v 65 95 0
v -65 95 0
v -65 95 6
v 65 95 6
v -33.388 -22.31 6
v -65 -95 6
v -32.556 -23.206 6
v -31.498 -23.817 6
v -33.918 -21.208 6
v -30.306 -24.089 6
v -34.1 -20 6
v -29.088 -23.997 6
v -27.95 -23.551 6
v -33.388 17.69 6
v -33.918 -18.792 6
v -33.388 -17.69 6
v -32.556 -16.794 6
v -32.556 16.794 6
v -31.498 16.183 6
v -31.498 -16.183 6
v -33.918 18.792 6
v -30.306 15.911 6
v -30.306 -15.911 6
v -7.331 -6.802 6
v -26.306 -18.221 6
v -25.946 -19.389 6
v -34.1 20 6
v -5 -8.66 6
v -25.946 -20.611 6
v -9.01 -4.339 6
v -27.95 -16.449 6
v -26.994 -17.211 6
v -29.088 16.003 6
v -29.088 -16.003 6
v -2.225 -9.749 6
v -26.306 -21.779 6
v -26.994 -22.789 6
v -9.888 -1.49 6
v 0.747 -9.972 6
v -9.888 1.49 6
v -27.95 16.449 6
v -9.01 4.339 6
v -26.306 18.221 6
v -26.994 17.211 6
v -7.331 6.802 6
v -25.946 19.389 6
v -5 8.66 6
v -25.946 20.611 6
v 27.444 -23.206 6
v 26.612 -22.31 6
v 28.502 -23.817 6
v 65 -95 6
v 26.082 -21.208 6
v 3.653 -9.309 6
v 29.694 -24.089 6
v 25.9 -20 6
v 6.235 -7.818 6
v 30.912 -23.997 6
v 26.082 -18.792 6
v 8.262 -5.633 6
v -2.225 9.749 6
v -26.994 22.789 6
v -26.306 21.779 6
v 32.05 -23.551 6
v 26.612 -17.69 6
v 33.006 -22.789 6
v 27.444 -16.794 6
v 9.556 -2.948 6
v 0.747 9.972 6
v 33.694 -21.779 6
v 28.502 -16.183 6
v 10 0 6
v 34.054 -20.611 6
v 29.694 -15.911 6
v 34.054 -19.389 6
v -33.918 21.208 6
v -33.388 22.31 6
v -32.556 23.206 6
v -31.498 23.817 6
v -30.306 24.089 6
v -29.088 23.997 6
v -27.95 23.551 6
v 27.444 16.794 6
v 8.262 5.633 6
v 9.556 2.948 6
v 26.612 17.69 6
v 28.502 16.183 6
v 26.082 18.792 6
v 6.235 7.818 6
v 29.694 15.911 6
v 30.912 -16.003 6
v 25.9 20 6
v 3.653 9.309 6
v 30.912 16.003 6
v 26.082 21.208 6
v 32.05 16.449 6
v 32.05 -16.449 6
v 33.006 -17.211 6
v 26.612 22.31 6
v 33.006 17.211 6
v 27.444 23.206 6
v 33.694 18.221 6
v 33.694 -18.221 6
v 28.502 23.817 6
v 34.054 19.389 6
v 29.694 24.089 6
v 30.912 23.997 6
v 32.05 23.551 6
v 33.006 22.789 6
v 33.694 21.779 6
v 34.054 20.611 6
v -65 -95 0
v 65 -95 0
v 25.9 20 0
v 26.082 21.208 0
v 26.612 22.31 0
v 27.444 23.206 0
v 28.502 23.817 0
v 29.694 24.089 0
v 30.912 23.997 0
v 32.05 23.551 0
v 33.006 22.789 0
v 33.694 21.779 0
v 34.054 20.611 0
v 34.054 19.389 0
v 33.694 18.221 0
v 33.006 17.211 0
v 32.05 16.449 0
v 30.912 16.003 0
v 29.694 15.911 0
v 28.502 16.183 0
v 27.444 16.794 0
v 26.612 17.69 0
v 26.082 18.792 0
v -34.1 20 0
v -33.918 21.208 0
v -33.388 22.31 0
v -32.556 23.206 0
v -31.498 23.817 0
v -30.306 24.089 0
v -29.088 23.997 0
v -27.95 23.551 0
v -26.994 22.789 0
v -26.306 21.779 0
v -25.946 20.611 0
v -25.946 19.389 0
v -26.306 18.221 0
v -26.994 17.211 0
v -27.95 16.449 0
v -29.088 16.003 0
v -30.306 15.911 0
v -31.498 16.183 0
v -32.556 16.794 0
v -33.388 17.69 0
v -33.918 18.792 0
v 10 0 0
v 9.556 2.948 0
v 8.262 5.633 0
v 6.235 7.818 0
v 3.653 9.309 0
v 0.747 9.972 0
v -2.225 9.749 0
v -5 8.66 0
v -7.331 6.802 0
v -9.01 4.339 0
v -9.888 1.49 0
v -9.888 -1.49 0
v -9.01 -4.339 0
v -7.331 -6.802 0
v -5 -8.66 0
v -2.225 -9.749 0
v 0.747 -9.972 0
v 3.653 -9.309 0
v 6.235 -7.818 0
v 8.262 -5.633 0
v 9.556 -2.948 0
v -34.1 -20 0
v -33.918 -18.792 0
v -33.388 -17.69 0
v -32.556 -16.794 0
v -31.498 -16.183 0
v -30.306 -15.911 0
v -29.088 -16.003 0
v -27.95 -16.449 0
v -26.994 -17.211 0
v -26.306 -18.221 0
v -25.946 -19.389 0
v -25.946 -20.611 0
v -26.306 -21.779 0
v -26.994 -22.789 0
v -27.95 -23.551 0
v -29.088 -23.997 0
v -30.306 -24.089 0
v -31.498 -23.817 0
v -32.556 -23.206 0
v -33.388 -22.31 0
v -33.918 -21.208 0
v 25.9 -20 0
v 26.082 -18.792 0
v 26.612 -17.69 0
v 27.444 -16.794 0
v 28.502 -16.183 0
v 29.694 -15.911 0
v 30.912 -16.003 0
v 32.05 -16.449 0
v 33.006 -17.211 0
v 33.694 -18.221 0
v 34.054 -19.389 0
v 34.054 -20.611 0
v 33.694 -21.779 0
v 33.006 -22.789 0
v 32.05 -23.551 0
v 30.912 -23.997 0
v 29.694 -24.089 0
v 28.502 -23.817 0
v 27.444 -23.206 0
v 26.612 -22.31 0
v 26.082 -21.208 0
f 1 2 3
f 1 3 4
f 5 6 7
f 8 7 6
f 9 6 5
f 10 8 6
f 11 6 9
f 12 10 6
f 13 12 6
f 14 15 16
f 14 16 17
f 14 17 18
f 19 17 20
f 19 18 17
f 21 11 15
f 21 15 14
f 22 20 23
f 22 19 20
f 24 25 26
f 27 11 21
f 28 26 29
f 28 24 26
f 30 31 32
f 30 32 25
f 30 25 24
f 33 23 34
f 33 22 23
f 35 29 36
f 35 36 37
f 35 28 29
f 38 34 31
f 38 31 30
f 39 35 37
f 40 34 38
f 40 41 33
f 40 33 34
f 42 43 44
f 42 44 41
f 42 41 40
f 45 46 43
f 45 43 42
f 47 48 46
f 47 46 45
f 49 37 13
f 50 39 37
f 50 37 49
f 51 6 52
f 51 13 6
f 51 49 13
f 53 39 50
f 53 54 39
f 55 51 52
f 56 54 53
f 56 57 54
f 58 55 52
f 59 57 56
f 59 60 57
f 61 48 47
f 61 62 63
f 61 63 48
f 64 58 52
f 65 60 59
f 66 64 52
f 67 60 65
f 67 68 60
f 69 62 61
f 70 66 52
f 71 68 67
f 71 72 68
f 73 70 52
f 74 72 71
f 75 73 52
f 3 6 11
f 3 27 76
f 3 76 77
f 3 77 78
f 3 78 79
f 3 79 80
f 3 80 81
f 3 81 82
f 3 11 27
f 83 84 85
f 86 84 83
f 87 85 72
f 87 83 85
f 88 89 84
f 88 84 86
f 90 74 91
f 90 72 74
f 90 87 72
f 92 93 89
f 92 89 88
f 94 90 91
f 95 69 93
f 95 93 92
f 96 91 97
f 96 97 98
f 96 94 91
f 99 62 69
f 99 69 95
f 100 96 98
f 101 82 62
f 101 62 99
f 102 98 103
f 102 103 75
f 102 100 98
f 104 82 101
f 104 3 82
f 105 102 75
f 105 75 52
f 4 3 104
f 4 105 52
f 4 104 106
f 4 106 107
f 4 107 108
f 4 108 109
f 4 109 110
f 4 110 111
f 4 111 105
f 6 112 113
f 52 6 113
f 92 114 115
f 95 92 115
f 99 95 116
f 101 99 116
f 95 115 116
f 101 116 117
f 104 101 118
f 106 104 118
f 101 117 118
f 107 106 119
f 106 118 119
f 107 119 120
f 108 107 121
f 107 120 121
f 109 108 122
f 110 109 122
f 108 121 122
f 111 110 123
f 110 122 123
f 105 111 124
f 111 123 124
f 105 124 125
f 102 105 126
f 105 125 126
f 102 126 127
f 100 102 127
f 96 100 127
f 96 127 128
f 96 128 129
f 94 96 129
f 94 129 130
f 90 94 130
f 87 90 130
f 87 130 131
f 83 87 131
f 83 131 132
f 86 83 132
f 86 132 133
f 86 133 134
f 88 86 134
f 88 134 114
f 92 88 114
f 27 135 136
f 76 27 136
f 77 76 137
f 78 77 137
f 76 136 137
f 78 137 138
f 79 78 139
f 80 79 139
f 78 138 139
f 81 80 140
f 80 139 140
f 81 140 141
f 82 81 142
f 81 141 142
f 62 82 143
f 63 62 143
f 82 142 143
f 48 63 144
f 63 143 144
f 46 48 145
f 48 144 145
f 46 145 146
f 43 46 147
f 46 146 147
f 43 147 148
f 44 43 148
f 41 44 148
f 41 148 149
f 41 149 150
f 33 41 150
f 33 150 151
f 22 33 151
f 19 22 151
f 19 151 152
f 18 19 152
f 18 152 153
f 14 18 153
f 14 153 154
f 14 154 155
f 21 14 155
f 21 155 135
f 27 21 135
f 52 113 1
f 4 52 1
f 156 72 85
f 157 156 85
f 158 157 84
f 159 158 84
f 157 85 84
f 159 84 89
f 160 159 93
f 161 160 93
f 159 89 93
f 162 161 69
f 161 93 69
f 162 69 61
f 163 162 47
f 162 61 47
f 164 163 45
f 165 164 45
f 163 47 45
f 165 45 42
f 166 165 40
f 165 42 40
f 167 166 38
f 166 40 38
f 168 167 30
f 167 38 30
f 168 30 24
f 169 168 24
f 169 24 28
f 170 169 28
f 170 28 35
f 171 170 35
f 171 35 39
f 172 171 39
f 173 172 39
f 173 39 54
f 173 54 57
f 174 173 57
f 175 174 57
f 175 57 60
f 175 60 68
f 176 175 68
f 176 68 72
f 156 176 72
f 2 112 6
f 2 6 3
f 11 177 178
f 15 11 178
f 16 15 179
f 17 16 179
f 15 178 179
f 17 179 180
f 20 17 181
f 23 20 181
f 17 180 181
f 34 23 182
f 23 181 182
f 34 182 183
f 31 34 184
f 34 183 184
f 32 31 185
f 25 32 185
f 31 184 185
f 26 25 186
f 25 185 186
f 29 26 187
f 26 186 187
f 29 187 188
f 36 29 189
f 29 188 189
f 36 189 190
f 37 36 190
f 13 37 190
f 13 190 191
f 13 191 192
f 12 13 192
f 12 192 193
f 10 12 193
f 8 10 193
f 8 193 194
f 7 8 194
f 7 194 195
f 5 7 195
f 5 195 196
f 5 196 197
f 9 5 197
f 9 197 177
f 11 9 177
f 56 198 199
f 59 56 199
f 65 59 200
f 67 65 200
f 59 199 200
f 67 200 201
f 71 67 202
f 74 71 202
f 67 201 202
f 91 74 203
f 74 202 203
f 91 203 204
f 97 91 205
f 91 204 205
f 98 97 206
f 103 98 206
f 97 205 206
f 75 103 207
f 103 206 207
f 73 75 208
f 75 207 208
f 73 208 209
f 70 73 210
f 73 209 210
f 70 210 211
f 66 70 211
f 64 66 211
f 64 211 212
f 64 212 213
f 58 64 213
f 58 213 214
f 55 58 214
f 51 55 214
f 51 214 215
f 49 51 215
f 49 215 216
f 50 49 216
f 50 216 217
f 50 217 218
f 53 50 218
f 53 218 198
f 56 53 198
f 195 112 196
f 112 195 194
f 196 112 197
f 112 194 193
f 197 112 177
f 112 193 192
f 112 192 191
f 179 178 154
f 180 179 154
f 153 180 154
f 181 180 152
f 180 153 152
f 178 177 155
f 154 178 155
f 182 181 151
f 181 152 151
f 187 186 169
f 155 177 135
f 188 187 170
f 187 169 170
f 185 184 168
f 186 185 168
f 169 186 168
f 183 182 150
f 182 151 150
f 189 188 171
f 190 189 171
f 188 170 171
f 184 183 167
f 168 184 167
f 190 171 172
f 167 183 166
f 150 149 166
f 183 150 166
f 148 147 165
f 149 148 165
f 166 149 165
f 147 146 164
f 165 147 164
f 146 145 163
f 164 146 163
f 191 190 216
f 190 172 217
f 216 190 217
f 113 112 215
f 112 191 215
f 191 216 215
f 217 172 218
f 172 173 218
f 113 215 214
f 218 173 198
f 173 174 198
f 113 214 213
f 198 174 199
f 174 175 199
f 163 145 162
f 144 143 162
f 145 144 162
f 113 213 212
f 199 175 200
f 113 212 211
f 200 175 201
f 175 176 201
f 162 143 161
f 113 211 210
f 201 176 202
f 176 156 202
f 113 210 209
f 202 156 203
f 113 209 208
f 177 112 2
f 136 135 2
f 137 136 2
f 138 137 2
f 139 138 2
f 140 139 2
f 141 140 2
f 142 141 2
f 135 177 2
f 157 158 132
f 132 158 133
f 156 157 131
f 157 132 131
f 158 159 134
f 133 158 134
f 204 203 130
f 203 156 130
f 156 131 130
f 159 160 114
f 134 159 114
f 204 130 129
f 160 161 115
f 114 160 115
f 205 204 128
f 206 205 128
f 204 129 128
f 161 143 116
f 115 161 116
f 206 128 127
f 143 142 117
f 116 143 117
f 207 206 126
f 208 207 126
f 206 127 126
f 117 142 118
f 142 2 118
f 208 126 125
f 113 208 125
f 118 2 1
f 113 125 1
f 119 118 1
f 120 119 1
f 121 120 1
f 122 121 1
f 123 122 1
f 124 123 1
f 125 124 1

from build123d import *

# Parameters (mm, degrees)
SKETCH1_W                = 130
SKETCH1_H                = 190
BOSS_EXTRUDE1_DEPTH      = 6
CUT_EXTRUDE1_REACH       = 117.265
SKETCH2_R                = 10
M8_CLEARANCE_HOLE1_D     = 8.2
M8_CLEARANCE_HOLE1_DEPTH = 19.75
M8_CLEARANCE_HOLE1_TIP   = 2.463528538


with BuildPart() as part:
    # Sketch1 → Boss-Extrude1 (new body)
    with BuildSketch(Plane.XY):
        Rectangle(SKETCH1_W, SKETCH1_H)
    extrude(amount=BOSS_EXTRUDE1_DEPTH)

    # Sketch2 → Cut-Extrude1 (cut, up to next)
    with BuildSketch(Plane.XY.offset(6), mode=Mode.PRIVATE) as cut_extrude1_sk1:
        with Locations((-1.55e-07, 0)):
            Circle(SKETCH2_R)
    cut_extrude1_tool1 = extrude(cut_extrude1_sk1.sketch, amount=-CUT_EXTRUDE1_REACH, mode=Mode.PRIVATE) & part.part
    add(cut_extrude1_tool1.solids().sort_by_distance((0, 0, 6))[0], mode=Mode.SUBTRACT)

    # M8 Clearance Hole1
    with Locations(Plane(origin=(-30, 20, 6), x_dir=(1, 0, 0), z_dir=(0, 0, 1))):
        with Locations((0, 0), (60, 0), (60, -40), (0, -40)):
            Hole(M8_CLEARANCE_HOLE1_D / 2, depth=M8_CLEARANCE_HOLE1_DEPTH)
            with Locations((0, 0, -(M8_CLEARANCE_HOLE1_DEPTH + M8_CLEARANCE_HOLE1_TIP / 2))):  # 118° drill point
                Cone(0, M8_CLEARANCE_HOLE1_D / 2, M8_CLEARANCE_HOLE1_TIP, mode=Mode.SUBTRACT)


solid = part.part
